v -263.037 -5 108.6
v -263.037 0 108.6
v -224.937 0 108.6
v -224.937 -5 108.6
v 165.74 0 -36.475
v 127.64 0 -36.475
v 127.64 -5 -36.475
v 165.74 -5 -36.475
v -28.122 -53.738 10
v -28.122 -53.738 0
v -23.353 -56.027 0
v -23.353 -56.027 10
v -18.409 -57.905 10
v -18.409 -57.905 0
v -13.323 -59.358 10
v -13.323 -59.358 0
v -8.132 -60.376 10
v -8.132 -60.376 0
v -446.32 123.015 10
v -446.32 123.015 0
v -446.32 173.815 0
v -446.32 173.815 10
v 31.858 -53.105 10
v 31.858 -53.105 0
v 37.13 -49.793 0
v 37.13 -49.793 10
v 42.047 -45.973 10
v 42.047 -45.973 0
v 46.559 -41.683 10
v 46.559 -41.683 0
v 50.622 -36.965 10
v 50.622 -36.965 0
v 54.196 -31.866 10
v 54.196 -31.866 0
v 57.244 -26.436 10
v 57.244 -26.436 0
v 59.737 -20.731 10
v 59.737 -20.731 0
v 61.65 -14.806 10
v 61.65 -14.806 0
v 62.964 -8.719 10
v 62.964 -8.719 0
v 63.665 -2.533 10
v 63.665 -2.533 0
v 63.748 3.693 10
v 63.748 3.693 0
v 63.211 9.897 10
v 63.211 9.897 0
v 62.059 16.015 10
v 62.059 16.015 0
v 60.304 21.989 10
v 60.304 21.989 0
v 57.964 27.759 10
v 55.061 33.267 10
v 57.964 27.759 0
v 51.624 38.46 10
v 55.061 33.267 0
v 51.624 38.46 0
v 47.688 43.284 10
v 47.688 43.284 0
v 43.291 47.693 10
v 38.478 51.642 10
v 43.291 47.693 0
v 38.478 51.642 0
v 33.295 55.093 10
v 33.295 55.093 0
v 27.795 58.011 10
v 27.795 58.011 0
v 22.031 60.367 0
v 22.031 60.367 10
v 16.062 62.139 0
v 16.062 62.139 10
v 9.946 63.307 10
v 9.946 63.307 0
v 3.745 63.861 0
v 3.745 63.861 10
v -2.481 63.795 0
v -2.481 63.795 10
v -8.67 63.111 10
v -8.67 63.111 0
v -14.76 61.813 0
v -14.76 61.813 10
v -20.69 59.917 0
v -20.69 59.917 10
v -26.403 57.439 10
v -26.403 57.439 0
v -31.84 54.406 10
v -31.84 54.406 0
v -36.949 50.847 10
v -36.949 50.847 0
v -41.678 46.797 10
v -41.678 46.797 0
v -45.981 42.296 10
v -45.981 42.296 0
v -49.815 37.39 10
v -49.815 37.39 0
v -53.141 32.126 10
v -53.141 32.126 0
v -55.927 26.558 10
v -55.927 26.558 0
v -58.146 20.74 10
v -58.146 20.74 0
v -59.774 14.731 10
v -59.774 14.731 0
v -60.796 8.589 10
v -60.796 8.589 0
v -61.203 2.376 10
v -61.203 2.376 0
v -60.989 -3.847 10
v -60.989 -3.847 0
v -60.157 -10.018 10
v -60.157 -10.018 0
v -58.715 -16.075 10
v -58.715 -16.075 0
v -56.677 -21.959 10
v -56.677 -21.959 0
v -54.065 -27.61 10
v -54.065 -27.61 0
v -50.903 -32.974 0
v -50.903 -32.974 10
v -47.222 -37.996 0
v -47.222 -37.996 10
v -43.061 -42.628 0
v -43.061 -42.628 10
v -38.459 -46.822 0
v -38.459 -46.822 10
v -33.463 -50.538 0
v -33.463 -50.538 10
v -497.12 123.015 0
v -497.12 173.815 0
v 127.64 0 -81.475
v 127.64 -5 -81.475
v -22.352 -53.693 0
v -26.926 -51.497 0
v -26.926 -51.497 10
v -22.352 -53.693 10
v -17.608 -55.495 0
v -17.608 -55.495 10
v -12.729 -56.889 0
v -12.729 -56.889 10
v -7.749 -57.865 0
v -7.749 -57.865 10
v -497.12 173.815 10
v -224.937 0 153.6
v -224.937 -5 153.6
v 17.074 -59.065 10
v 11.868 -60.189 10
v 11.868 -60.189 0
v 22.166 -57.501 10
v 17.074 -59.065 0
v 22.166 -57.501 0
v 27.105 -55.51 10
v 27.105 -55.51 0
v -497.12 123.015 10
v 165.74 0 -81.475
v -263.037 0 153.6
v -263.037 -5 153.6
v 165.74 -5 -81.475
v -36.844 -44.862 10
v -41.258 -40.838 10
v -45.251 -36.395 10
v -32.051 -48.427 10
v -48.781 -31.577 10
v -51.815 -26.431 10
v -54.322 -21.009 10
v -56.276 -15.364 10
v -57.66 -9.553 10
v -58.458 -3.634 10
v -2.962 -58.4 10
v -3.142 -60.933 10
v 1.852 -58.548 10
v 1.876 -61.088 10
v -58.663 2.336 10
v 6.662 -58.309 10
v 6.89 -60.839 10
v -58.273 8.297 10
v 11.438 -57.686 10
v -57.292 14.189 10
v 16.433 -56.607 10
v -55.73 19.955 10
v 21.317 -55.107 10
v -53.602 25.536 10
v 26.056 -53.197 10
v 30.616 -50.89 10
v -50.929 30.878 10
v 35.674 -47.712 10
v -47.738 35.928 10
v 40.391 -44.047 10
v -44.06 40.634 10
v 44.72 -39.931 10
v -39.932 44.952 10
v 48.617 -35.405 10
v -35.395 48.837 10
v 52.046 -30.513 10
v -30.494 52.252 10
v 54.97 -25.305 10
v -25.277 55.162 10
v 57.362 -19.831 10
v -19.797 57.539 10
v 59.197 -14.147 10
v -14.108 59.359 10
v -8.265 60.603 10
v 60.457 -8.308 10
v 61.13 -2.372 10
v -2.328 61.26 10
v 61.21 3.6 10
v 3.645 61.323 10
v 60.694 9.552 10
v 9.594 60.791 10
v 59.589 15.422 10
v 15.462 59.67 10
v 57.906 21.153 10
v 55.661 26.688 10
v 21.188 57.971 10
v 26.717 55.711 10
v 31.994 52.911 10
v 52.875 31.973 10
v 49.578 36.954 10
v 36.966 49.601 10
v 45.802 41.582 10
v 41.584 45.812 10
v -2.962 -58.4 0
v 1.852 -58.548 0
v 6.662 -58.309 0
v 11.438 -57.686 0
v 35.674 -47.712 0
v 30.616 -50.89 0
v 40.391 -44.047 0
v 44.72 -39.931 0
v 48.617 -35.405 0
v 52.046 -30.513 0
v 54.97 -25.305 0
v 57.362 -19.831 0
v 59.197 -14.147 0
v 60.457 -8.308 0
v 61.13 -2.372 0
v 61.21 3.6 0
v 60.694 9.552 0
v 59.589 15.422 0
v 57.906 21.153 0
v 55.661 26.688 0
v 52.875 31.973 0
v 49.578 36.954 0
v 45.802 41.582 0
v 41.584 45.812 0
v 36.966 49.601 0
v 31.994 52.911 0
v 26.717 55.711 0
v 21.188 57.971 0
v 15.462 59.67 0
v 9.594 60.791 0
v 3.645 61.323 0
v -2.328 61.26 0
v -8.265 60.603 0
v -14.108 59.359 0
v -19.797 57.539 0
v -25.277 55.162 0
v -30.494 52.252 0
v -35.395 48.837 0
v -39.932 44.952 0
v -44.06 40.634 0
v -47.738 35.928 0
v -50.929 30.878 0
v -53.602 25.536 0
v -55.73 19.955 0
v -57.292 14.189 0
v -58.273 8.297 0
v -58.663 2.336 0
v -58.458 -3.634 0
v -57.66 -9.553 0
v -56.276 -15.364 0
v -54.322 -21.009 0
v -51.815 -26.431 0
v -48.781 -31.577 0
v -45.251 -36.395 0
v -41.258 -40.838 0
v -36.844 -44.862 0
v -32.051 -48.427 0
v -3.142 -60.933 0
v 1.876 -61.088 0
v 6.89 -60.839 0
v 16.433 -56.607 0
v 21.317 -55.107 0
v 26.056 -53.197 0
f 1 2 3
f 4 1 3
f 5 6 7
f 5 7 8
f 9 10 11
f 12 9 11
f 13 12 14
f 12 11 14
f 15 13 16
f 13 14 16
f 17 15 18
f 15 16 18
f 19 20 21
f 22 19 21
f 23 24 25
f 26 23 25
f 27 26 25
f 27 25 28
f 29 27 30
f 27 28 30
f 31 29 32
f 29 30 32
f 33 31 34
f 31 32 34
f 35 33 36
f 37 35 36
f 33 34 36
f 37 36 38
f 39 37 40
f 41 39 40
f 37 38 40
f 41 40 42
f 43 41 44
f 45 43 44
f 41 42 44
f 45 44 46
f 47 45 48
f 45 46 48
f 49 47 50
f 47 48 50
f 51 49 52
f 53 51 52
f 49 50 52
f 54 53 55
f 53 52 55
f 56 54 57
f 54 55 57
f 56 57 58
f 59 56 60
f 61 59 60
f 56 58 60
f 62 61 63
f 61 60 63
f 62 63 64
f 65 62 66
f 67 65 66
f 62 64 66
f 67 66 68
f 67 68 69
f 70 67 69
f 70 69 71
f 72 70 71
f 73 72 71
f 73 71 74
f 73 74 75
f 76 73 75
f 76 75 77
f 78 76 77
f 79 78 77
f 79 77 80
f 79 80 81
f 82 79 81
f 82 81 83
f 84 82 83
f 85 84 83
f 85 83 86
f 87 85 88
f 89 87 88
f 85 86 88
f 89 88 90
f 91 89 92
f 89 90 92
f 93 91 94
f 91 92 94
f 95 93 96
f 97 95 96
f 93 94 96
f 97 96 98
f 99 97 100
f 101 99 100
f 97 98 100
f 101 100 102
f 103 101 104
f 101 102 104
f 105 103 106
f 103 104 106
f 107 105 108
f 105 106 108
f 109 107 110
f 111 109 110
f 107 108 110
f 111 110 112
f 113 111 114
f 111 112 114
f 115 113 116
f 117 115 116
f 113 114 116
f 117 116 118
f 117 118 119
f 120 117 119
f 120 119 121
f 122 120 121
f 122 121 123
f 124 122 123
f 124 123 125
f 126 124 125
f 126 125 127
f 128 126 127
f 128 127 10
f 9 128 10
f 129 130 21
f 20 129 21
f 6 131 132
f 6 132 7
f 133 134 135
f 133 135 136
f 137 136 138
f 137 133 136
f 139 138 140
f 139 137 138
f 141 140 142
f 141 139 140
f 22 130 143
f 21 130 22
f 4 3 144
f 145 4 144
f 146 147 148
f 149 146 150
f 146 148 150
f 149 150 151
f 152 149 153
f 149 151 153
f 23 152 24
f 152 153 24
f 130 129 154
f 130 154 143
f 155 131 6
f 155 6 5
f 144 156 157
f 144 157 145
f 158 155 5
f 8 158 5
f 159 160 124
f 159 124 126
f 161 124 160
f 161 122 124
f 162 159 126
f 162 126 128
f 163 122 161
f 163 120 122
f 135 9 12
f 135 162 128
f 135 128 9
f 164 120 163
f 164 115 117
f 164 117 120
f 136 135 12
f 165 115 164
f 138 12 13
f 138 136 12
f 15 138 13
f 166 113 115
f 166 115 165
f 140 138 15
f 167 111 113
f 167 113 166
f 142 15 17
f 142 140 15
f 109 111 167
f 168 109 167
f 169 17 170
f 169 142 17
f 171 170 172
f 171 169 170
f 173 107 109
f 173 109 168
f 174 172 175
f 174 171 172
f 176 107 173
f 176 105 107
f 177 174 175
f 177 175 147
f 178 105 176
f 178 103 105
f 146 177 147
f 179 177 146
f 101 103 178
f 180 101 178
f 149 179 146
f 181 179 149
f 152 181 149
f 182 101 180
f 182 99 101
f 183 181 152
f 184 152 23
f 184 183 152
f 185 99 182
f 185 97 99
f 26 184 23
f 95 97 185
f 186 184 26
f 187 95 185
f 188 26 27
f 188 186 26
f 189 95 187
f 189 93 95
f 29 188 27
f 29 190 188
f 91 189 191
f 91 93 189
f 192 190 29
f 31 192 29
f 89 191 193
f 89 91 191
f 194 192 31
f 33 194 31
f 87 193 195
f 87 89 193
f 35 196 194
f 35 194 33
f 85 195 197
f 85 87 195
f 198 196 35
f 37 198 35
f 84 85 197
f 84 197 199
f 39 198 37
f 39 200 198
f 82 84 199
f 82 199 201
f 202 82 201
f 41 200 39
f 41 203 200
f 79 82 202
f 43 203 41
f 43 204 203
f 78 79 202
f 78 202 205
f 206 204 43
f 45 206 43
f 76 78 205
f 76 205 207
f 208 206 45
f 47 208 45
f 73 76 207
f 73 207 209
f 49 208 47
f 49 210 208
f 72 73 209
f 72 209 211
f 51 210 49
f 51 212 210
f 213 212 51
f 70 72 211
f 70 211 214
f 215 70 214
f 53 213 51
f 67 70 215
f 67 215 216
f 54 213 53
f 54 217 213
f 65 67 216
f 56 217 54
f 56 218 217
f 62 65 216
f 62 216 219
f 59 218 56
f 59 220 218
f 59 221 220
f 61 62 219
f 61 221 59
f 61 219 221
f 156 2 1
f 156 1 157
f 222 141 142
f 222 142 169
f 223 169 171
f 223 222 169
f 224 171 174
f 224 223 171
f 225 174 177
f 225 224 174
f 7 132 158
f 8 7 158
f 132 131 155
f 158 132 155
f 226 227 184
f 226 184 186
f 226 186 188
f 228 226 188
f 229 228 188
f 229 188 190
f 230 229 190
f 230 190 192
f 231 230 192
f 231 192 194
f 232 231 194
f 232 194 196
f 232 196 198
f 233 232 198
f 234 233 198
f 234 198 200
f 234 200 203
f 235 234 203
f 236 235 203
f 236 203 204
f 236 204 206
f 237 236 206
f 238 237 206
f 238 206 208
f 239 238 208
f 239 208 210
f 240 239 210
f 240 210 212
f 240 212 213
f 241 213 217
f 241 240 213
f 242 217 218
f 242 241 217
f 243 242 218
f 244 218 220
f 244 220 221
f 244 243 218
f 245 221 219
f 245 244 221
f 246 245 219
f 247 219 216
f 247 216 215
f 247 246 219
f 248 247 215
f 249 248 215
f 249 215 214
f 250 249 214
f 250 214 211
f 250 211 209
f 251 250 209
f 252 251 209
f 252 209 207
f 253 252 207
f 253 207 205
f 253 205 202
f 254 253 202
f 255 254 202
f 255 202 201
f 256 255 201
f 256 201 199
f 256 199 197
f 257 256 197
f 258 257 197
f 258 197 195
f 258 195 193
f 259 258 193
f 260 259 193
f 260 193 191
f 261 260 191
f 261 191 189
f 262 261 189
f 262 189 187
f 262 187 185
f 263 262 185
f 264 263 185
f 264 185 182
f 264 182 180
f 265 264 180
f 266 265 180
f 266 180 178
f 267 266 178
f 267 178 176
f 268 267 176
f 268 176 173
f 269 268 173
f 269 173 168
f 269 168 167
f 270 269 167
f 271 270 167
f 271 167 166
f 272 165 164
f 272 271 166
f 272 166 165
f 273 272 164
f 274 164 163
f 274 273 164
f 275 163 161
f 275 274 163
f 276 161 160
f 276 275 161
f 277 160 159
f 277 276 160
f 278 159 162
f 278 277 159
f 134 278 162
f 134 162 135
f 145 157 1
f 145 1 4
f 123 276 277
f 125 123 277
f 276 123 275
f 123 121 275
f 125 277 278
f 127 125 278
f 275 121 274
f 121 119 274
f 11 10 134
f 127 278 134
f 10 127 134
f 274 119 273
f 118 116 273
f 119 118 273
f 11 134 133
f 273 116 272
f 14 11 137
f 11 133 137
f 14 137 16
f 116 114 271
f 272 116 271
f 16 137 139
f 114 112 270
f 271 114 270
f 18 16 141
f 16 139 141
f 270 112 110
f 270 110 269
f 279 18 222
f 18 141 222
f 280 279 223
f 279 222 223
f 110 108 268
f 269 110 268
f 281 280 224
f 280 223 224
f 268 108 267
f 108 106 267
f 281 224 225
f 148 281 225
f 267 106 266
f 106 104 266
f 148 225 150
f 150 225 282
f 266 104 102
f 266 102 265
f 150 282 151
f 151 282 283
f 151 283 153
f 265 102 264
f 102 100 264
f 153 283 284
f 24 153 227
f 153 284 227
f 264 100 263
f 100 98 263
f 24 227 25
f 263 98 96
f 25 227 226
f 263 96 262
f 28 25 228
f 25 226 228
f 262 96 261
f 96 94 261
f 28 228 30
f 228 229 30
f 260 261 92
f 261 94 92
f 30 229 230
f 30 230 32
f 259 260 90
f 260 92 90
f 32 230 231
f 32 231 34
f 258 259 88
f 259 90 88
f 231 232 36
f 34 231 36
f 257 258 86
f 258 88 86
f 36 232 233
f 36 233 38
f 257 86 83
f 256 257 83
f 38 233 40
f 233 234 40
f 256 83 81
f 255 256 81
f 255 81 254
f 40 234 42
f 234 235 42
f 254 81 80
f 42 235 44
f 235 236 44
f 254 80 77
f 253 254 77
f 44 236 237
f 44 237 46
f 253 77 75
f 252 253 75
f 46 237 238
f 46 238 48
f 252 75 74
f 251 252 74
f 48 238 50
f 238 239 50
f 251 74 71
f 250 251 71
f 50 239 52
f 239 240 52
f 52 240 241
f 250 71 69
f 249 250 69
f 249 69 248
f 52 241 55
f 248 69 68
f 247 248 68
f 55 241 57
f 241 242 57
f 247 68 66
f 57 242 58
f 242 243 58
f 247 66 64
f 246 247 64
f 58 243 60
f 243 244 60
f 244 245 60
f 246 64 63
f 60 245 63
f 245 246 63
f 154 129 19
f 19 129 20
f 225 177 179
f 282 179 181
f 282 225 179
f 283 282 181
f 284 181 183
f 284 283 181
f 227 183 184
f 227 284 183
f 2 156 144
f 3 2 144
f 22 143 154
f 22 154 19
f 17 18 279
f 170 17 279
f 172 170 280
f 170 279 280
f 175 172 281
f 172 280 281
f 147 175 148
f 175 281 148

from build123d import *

# Parameters (mm, degrees)
F0_W     = 50.8
F0_H     = 50.8
F1_DEPTH = 10
F2_W     = 38.1
F2_H     = 45
F3_DEPTH = 5
F4_DEPTH = 10
F5_T     = -2.54


with BuildPart() as f1:
    # F0 (on Top) → F1 (new body)
    with BuildSketch(Plane.XY):
        with Locations((-471.7197247505, 148.414934361)):
            Rectangle(F0_W, F0_H)
    extrude(amount=F1_DEPTH)

    # F0 (on Top) → F4 (join)
    with BuildSketch(Plane.XY):
        with Locations((-471.7197247505, 148.414934361)):
            Rectangle(F0_W, F0_H)
    extrude(amount=F4_DEPTH)


with BuildPart() as f1b:
    # F0 (on Top) → F1, piece 2 (new body)
    with BuildSketch(Plane.XY):
        with BuildLine():
            Line((-8.131954578, -53.7377994335), (-28.121754578, -53.7377994335))
            ThreePointArc((-28.121754578, -53.7377994335), (-18.408530018, -57.905263406), (-8.131954578, -60.3763936215))
            Line((-8.131954578, -60.3763936215), (-8.131954578, -53.7377994335))
        make_face()
        with BuildLine():
            ThreePointArc((31.857845422, -53.1052611768), (55.219168501, -30.1797705392), (63.7898047969, 1.4093688994))
            ThreePointArc((63.7898047969, 1.4093688994), (-30.8662796901, 55.0026168926), (-28.121754578, -53.7377994335))
            Line((-28.121754578, -53.7377994335), (-8.131954578, -53.7377994335))
            Line((-8.131954578, -53.7377994335), (-8.131954578, -60.3763936215))
            ThreePointArc((-8.131954578, -60.3763936215), (1.8755927876, -61.0878858598), (11.868045422, -60.1889332305))
            Line((11.868045422, -60.1889332305), (11.868045422, -53.1052611768))
            Line((11.868045422, -53.1052611768), (31.857845422, -53.1052611768))
        make_face()
        with BuildLine():
            ThreePointArc((11.868045422, -60.1889332305), (22.1655974194, -57.5011673601), (31.857845422, -53.1052611768))
            Line((31.857845422, -53.1052611768), (11.868045422, -53.1052611768))
            Line((11.868045422, -53.1052611768), (11.868045422, -60.1889332305))
        make_face()
    extrude(amount=F1_DEPTH)

    # F5
    f5_openings = [f1b.faces().sort_by_distance(p)[0] for p in [
        (1.289805, 1.409369, 10),
        (1.289805, 1.409369, 0),
    ]]
    offset(amount=F5_T, openings=f5_openings)


with BuildPart() as f3:
    # F2 (on Front) → F3 (new body)
    with BuildSketch(Plane.XZ):
        with Locations((146.6897795882, -58.9751662547)):
            Rectangle(F2_W, F2_H)
    extrude(amount=F3_DEPTH)


with BuildPart() as f3b:
    # F2 (on Front) → F3, piece 2 (new body)
    with BuildSketch(Plane.XZ):
        with Locations((-243.9871954038, 131.100037545)):
            Rectangle(F2_W, F2_H)
    extrude(amount=F3_DEPTH)


solid = Compound([f1.part, f1b.part, f3.part, f3b.part])
